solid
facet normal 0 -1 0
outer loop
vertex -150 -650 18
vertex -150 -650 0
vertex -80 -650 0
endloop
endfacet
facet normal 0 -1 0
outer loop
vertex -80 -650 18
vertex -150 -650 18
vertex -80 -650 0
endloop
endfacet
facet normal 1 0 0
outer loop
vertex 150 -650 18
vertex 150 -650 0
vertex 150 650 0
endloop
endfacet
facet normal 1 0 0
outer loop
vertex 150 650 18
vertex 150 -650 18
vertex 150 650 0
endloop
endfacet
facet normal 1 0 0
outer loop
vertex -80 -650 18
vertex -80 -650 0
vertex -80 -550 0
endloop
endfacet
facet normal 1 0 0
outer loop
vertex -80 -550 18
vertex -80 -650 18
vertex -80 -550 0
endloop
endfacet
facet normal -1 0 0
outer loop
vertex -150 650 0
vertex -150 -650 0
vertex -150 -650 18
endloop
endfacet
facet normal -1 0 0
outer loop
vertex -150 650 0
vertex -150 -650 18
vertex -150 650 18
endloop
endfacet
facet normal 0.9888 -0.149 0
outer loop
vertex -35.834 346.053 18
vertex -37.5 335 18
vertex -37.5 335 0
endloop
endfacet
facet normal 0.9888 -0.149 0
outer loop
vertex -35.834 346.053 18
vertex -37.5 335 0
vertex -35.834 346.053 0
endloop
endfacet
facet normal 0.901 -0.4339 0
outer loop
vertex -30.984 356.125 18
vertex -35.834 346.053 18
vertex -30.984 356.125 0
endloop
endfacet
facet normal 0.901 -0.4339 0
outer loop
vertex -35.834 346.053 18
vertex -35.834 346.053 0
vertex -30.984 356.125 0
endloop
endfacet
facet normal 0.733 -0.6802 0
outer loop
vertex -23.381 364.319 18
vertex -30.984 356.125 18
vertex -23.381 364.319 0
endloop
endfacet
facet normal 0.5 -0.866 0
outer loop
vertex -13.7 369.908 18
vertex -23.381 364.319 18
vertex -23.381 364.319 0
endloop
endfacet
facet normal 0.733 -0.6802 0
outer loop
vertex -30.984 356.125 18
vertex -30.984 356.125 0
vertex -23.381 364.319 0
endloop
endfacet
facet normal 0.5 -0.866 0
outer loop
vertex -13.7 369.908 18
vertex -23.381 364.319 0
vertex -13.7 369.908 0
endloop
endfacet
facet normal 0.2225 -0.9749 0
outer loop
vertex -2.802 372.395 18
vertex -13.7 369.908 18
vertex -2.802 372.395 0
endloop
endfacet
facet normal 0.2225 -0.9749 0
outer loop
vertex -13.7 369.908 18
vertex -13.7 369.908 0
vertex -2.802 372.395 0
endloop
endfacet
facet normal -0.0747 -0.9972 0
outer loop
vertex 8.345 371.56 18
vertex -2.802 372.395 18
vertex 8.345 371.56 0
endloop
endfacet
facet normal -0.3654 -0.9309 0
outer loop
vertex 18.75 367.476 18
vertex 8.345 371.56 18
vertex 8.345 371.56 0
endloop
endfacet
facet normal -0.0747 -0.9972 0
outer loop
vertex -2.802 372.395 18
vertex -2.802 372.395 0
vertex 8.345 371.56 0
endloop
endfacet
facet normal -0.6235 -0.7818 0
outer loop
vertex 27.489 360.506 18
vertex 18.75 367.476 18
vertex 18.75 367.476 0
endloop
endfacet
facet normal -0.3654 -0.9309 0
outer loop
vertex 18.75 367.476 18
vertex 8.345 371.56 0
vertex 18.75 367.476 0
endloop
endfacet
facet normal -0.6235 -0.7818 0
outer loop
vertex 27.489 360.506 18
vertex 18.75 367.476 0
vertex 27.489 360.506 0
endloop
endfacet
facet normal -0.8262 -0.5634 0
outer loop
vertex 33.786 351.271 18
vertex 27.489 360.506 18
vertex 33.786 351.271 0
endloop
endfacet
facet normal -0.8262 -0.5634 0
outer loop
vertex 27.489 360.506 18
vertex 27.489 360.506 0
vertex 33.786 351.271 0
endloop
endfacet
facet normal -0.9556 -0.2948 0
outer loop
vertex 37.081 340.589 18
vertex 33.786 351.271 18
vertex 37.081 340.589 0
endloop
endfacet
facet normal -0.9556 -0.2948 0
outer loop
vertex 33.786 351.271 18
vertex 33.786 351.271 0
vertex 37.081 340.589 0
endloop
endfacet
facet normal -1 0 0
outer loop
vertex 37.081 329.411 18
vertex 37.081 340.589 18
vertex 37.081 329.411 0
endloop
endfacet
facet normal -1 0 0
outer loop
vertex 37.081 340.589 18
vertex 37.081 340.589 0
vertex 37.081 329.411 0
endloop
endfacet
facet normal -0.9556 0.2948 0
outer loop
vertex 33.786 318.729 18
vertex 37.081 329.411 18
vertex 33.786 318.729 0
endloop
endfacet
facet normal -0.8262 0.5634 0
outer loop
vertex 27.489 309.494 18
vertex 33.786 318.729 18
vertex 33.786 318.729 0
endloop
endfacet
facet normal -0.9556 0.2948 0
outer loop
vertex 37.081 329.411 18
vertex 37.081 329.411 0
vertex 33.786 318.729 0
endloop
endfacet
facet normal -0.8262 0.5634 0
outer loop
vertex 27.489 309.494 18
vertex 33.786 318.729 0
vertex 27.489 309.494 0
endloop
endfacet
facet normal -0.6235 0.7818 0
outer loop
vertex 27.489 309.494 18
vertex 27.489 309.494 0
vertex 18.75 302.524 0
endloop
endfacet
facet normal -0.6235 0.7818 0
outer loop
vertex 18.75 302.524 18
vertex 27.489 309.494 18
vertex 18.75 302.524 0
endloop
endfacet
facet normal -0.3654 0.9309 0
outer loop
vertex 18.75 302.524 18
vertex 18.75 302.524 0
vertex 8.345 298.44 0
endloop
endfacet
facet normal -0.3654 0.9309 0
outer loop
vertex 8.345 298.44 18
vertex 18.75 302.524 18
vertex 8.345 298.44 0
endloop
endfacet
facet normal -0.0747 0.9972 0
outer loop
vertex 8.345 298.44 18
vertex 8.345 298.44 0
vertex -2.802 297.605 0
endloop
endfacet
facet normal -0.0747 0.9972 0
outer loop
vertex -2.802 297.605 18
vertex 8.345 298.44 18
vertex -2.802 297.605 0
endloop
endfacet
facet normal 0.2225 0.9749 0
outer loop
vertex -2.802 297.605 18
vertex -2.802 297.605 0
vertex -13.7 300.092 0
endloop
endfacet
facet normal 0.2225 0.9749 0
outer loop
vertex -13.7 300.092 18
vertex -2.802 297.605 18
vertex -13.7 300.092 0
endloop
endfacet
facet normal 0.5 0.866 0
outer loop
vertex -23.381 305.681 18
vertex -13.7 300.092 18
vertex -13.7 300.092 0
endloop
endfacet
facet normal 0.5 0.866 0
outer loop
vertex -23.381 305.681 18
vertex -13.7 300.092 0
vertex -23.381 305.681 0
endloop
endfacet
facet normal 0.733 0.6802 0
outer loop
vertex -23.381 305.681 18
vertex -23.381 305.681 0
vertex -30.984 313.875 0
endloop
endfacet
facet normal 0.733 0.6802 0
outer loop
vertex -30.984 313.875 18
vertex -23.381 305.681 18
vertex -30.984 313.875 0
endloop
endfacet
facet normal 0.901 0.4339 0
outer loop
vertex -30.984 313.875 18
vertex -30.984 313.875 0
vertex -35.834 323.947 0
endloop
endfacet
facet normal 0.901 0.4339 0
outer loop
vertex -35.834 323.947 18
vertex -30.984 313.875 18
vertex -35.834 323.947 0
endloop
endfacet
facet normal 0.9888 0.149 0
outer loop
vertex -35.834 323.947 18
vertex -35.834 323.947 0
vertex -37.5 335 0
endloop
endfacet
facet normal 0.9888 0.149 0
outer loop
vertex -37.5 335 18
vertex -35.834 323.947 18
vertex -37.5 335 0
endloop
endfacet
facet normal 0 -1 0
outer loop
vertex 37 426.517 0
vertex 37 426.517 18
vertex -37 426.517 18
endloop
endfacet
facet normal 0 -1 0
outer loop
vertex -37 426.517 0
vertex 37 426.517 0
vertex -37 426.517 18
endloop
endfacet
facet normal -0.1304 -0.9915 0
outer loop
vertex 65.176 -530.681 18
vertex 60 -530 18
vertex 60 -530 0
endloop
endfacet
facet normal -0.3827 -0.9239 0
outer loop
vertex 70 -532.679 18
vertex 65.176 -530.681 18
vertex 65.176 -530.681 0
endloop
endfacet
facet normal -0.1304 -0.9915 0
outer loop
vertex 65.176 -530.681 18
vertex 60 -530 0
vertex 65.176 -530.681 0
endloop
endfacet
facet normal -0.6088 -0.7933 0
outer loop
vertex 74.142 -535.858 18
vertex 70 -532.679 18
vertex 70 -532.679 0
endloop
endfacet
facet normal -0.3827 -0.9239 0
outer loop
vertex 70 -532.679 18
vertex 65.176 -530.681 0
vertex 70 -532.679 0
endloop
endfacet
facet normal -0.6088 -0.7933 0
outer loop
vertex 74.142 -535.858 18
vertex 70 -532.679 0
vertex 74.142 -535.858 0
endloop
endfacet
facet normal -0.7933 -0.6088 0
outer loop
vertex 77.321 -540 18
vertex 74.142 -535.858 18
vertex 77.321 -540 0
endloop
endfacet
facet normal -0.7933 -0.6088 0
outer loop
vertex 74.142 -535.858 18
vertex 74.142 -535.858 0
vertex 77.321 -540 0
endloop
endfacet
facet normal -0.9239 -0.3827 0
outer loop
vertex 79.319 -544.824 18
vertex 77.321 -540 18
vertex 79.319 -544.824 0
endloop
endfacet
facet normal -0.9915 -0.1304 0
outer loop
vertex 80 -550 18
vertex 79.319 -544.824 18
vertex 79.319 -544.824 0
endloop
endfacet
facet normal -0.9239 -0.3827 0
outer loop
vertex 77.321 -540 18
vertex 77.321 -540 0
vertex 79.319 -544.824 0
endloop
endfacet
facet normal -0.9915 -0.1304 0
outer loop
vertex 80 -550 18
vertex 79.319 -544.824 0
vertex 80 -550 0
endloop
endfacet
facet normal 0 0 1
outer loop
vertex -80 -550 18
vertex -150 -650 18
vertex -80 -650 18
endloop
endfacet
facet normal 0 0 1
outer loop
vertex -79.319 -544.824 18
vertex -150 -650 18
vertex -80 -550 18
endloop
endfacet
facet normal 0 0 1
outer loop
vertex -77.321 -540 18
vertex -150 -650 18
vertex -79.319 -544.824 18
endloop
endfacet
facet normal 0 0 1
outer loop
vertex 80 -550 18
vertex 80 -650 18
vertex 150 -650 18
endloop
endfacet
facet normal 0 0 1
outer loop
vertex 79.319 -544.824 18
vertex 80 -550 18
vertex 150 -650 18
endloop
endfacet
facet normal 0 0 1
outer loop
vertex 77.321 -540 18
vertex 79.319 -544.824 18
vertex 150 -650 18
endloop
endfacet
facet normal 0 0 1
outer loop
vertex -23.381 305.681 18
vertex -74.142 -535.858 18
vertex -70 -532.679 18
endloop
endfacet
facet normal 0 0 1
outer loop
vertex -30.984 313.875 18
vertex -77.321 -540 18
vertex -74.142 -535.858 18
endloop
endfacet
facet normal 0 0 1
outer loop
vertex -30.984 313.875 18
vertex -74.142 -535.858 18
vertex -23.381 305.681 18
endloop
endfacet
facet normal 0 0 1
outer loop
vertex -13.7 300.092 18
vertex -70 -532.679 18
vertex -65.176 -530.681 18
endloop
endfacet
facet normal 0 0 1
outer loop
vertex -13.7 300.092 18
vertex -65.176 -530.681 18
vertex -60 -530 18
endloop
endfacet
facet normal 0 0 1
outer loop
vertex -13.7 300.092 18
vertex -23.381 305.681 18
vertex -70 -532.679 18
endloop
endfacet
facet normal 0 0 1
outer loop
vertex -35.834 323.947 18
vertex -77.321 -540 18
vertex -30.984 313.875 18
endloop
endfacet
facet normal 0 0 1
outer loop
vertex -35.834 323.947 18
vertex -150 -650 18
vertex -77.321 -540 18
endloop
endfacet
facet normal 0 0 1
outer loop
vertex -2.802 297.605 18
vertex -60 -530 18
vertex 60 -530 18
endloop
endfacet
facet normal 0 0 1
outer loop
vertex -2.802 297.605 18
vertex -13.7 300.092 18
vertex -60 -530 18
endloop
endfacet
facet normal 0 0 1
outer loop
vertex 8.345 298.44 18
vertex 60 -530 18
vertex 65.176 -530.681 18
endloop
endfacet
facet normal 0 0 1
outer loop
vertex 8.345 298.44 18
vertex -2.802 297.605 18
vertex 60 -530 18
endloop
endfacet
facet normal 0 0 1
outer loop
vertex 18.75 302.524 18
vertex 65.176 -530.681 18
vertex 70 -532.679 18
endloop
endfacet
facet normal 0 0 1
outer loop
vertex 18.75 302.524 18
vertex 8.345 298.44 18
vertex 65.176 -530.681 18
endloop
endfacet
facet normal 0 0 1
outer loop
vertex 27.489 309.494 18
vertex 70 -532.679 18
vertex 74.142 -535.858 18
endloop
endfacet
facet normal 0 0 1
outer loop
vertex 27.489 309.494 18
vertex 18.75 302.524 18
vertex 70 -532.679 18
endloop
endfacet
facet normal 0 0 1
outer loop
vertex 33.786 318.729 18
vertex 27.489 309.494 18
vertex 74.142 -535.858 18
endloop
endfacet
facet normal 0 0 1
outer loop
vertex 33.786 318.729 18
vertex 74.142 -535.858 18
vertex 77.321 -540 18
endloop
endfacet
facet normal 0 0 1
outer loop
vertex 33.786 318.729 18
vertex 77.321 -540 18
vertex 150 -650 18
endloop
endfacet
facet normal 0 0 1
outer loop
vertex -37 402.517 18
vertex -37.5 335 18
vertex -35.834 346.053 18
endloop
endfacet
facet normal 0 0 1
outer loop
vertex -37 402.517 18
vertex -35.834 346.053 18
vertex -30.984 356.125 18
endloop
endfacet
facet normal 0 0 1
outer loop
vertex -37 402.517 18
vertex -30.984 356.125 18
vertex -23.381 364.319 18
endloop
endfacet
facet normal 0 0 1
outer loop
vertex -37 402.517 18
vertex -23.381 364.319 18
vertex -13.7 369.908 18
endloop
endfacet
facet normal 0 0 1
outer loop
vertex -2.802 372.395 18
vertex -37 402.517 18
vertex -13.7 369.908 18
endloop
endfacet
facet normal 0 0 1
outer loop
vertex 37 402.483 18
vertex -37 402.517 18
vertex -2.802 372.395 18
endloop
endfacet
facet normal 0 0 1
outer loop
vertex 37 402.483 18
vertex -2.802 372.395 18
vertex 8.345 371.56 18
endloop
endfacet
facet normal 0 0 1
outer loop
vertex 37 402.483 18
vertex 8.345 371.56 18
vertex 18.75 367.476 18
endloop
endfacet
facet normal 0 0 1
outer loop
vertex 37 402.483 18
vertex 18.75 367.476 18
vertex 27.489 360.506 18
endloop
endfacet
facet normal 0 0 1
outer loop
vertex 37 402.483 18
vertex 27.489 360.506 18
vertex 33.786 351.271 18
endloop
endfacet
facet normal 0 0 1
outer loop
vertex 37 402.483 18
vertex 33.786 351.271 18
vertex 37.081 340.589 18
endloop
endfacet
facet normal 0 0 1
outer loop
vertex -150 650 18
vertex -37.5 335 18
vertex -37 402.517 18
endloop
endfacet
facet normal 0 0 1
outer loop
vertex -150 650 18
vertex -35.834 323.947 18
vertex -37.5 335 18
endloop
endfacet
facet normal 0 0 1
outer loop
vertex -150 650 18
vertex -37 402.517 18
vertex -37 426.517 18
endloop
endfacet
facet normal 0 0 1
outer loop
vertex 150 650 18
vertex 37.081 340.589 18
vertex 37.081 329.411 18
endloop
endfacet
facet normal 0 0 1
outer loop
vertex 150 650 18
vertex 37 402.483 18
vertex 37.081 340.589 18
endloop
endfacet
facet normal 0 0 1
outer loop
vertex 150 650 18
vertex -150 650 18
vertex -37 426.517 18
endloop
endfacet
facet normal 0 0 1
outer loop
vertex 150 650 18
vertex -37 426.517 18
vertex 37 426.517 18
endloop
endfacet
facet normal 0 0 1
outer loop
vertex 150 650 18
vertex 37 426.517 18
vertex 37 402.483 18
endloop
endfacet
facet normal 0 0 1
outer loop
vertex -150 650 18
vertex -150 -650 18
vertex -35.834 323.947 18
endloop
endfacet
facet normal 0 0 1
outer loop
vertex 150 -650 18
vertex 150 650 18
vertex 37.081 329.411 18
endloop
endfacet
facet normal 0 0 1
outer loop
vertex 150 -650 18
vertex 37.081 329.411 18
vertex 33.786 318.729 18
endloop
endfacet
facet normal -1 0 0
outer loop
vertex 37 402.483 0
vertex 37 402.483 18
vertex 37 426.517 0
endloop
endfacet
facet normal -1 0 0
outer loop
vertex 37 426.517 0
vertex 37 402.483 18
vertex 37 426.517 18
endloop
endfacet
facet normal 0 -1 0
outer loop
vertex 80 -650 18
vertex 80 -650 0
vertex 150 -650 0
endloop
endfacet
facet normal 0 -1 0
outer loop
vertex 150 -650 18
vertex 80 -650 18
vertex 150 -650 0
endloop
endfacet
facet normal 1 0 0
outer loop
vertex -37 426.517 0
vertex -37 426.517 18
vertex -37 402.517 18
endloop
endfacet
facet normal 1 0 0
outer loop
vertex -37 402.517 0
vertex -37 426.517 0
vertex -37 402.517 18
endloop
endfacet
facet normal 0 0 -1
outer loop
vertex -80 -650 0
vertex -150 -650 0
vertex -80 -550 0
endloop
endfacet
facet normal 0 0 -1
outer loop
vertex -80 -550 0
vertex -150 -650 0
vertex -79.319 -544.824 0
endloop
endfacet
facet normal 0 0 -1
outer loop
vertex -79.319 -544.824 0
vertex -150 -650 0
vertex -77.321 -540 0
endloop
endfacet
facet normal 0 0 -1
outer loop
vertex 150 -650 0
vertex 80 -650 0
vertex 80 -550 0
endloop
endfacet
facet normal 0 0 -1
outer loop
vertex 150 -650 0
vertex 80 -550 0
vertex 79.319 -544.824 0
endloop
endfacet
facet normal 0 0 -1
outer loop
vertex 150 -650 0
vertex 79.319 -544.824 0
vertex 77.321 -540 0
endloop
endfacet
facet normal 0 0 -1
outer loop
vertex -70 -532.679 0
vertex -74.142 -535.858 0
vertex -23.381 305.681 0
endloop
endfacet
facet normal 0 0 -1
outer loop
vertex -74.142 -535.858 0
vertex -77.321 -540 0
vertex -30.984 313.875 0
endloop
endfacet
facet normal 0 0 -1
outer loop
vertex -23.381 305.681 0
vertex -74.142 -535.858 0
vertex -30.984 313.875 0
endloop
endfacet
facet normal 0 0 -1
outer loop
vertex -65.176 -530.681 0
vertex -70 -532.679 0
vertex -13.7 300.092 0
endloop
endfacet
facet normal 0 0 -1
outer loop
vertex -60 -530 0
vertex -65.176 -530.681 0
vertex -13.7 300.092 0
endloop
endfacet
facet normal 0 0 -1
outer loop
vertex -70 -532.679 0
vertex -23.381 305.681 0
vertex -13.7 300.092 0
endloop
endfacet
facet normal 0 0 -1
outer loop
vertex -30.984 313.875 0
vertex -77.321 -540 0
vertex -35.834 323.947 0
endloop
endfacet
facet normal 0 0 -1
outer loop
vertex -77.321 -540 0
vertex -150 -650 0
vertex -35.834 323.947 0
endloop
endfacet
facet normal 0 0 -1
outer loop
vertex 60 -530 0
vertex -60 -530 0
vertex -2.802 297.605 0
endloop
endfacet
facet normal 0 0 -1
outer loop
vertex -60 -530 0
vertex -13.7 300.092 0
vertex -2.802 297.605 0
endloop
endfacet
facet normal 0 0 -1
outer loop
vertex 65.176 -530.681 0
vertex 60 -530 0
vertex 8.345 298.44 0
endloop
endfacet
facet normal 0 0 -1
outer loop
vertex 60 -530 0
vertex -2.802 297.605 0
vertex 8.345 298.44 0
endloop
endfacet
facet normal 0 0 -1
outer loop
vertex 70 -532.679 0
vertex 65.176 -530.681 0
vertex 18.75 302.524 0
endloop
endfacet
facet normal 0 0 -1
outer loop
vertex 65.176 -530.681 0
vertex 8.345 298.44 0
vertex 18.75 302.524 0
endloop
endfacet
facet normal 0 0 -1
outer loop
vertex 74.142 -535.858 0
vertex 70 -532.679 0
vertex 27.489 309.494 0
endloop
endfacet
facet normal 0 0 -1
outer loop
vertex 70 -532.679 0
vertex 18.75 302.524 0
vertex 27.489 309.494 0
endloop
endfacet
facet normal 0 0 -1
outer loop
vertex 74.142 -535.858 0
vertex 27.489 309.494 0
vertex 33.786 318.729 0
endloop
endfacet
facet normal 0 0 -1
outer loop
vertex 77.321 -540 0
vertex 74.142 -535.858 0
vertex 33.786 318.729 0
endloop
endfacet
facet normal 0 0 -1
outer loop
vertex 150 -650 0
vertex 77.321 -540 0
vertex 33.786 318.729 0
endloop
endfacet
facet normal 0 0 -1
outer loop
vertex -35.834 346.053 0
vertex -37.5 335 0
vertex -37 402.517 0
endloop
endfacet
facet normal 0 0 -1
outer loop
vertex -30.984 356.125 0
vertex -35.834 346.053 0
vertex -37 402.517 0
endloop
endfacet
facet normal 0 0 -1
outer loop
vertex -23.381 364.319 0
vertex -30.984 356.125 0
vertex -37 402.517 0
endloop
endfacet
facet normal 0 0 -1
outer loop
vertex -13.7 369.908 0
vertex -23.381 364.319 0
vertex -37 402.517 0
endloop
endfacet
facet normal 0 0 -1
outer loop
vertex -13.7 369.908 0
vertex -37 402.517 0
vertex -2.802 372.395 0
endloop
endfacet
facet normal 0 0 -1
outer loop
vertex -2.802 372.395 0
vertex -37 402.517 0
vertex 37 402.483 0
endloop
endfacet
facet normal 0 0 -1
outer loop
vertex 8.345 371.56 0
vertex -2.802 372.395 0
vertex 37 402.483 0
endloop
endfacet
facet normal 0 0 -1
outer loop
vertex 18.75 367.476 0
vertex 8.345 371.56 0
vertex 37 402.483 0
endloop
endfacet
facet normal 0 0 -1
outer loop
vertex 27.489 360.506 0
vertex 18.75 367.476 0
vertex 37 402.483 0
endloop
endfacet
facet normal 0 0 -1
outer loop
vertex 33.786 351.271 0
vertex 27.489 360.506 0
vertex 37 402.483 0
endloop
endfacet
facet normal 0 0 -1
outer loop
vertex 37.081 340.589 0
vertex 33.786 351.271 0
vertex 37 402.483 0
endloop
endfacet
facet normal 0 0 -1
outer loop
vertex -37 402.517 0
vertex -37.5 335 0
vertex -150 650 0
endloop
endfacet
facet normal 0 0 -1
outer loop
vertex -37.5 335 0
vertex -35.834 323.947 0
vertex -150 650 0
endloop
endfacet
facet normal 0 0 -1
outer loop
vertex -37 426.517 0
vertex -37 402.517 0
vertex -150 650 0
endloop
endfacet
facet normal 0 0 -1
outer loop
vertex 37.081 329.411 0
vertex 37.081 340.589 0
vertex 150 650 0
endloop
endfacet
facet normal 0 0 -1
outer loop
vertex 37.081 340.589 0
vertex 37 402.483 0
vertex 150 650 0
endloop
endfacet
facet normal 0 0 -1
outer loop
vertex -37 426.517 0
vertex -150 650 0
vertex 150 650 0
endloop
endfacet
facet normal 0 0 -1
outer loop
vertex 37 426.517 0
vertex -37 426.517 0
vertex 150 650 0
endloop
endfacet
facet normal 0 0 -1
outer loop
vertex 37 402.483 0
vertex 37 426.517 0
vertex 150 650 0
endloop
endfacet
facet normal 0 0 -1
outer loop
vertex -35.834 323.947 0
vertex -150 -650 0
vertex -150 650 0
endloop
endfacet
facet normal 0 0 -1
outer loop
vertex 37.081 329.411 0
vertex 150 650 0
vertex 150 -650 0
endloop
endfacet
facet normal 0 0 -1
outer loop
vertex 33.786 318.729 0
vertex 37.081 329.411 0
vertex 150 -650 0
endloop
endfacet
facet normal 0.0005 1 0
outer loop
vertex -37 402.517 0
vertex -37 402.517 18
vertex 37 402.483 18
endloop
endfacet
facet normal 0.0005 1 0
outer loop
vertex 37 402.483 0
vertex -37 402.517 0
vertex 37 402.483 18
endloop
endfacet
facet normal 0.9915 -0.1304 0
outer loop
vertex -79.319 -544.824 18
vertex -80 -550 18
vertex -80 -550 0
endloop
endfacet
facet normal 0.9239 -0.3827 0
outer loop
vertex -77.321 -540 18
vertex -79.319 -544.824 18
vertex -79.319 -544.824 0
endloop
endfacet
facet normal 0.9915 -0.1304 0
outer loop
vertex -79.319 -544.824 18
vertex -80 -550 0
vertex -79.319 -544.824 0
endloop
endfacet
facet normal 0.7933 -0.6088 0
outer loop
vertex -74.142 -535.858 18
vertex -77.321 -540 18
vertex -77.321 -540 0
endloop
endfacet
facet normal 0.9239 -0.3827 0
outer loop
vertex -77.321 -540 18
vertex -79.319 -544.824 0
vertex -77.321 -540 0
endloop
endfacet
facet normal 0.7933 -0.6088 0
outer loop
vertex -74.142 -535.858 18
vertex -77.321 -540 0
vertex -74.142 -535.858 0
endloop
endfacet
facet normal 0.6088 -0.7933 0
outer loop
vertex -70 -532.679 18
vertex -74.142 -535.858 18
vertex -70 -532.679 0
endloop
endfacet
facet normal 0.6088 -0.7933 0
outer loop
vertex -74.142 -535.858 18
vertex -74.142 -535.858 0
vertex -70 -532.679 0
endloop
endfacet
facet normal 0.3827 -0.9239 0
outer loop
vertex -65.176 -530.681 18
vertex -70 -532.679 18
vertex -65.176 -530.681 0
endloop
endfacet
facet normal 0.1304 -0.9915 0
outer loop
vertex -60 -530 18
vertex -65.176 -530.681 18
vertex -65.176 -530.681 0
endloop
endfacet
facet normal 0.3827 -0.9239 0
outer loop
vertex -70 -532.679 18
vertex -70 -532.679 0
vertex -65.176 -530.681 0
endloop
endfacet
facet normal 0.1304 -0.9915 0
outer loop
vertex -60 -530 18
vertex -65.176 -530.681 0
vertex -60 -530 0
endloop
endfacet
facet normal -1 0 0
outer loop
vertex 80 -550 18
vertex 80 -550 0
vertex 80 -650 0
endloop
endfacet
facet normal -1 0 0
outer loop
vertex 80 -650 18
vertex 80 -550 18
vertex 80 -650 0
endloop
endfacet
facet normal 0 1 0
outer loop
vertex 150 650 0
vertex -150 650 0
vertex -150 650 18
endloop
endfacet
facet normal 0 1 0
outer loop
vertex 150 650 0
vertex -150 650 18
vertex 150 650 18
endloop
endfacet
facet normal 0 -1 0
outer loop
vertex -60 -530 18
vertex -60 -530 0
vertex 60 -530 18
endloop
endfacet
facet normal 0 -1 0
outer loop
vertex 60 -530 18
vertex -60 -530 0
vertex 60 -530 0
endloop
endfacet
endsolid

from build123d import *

# Parameters (mm, degrees)
ESBO_O1_W                = 300
ESBO_O1_H                = 1300
RESSALTO_EXTRUS_O1_DEPTH = 18
CORTE_EXTRUS_O1_DEPTH    = 668.326007286
ESBO_O3_R                = 37.5
CORTE_EXTRUS_O2_DEPTH    = 668.326007286
CORTE_EXTRUS_O3_DEPTH    = 668.326007286


with BuildPart() as part:
    # Esboço1 → Ressalto-extrusão1 (new body)
    with BuildSketch(Plane.XY):
        Rectangle(ESBO_O1_W, ESBO_O1_H)
    extrude(amount=RESSALTO_EXTRUS_O1_DEPTH)

    # Esboço2 → Corte-extrusão1 (cut, through all)
    with BuildSketch(Plane(origin=(0, 0, 0), x_dir=(-1, 0, 0), z_dir=(0, 0, -1))):
        with BuildLine():
            Line((-80, -650), (80, -650))
            Line((80, -650), (80, -550))
            ThreePointArc((80, -550), (74.142135624, -535.857864376), (60, -530))
            Line((60, -530), (-60, -530))
            ThreePointArc((-60, -530), (-74.142135624, -535.857864376), (-80, -550))
            Line((-80, -550), (-80, -650))
        make_face()
    extrude(amount=-CORTE_EXTRUS_O1_DEPTH, mode=Mode.SUBTRACT)

    # Esboço3 → Corte-extrusão2 (cut, through all)
    with BuildSketch(Plane(origin=(0, 0, 0), x_dir=(-1, 0, 0), z_dir=(0, 0, -1))):
        with Locations((0, 335)):
            Circle(ESBO_O3_R)
    extrude(amount=-CORTE_EXTRUS_O2_DEPTH, mode=Mode.SUBTRACT)

    # Esboço4 → Corte-extrusão3 (cut, through all)
    with BuildSketch(Plane.XY.offset(18)):
        Polygon((-37, 402.517498316), (37, 402.482501684), (37, 426.517498316), (-37, 426.517498316), align=None)
    extrude(amount=-CORTE_EXTRUS_O3_DEPTH, mode=Mode.SUBTRACT)


solid = part.part
